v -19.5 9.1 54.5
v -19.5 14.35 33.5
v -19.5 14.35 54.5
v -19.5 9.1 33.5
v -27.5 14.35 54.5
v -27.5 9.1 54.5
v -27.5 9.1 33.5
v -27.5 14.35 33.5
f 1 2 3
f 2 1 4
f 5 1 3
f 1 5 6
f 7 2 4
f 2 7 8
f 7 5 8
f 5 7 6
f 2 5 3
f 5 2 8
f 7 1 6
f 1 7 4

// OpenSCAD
// file: D:/Projects/assembly-workshop/outputs/Screen_Pi_Hue_SCR5-H8_2026-10-31/checks/geometry.scad
// SCR5-G; mm; FRONT view: X right, Z up, Y into rack. Glass/plate front Y=0.
// Measured values: work/screen-5in/Dimensions.md. Physical fit/strength UNKNOWN.
part="plate";
DROP=0.45; // coupon winner can be substituted here; all three pins use this DROP
LIP=0.8; LIP_ON=true;
LIP_EDGES=[true,true,false,false]; // left,right,bottom,top; Brian: side lips only, cosmetic
FRAME_STEP=1.5; // measured glass-edge inset to metal LCD frame, left/right only
SHIM=0; // moves rear frame seat and plate-boss mating face back
$fn=48;
GCX=33; GCZ=41.5; PW=252; PH=88.8; PT=4;
GW=120.7; GH=77.2; CLEAR=0.2; WW=GW+2*CLEAR; WH=GH+2*CLEAR;
SEAT=13.3+SHIM; FT=3;
SO=[56.45,34]; BTN_X=[45.5,35.5,25.5];
PCB_TOP=38; GAP=0.10; LEAF_T=0.8;
HOLE=[3.4,40.3,44.7];
BX=[GCX-68,GCX+68]; BZ=[10,72];
// DSI connector X extent is unmeasured: conservative assumed 8 mm inward from PCB edge.
DSI=[GCX-60.5,9.1,GCZ-38+30,8,5.25,21];
module xz(y,d){translate([0,y+d,0])rotate([90,0,0])linear_extrude(d)children();}
// rr/rack_slots copied from SCR5-F; same exact slot centres, outline shifted -0.05 Z to centre 44.4.
module rr(w,h,r){hull()for(x=[-w/2+r,w/2-r],z=[-h/2+r,h/2-r])translate([x,z])circle(r=r);}
module rack_slots(){for(x=[-118.2625,118.2625],z=[6.323,38.127,50.773,82.577])translate([x,z])hull()for(dx=[-1.5,1.5])translate([dx,0])circle(d=7);}
module cyl_y(x,y,z,d,h){translate([x,y,z])rotate([-90,0,0])cylinder(d=d,h=h);}
module window_cut(){
  xz(-0.02,4.04)translate([GCX,GCZ])square([WW,WH],center=true);
  // 0.3 x 45-degree chamfer, square corners, front only.
  translate([GCX,0.3,GCZ])rotate([90,0,0])
    linear_extrude(height=0.3,scale=[(WW+0.6)/WW,(WH+0.6)/WH])square([WW,WH],center=true);
}
module lips(){
  // Cosmetic side ledges only; rear frame/standoffs set depth and retain the screen.
  if(LIP_ON)for(i=[0:3])if(LIP_EDGES[i]){
    if(i<2)translate([GCX+(i==0?-WW/2:WW/2-LIP),2.5,GCZ-GH/2+4])cube([LIP,0.8,GH-8]);
    else translate([GCX-GW/2+4,2.5,GCZ+(i==2?-WH/2:WH/2-LIP)])cube([GW-8,0.8,LIP]);
  }
}
// Leaf/nub/bump geometry copied from SCR5-WP-A, translated to this glass centre.
module leaves(){for(x=BTN_X)translate([GCX+x-1.5,0,GCZ]){
  translate([0,0,PCB_TOP+GAP+0.9+0.1])cube([3,11.8,LEAF_T]);
  translate([0,10.2,PCB_TOP+GAP])cube([3,1.4,1.0+LEAF_T/2]);
  translate([0,10.4,PCB_TOP+GAP+1.0+LEAF_T])cube([3,1.0,0.9]);
}}
module plate(){difference(){union(){
  difference(){xz(0,PT)translate([0,PH/2])rr(PW,PH,2.5);window_cut();}
  for(x=BX,z=BZ)cyl_y(x,3.9,z,8,SEAT-3.9);
  leaves(); lips();
 }
 xz(-0.02,4.04)rack_slots();
 for(x=BTN_X)translate([GCX+x-HOLE[0]/2,-0.02,GCZ+HOLE[1]])cube([HOLE[0],SEAT+FT+0.04,HOLE[2]-HOLE[1]]);
 // Printed-in screw pilots (no heat-set OD assumption): nominal M2.5, fit UNKNOWN.
 for(x=BX,z=BZ)cyl_y(x,SEAT-6,z,2.1,6.02);
 // Rear engraving, 0.5 deep, left field.
 xz(3.5,0.52)translate([-75,40])mirror([1,0])text("SCR5-G",size=6,halign="center",font="Liberation Sans:style=Bold");
}}
module frame_blank(){
  // C-shaped perimeter; no material across the board centre / touch FPC.
  xz(SEAT,FT)translate([GCX,GCZ])difference(){square([132,76],center=true);square([116,60],center=true);}
  for(sx=[-1,1],sz=[-1,1])cyl_y(GCX+sx*SO[0],SEAT,GCZ+sz*SO[1],9,FT);
  for(x=BX,z=BZ)hull(){cyl_y(x,SEAT,z,8,FT);cyl_y(GCX+(x<GCX?-62:62),SEAT,z,8,FT);}
}
module dsi_keepout(){translate([DSI[0]-3,DSI[1]-3,DSI[2]-3])cube([DSI[3]+6,DSI[4]+6,DSI[5]+6]);}
module ribbon_route(){
  // Open left/up corridor 18 mm wide; extends past top of plate.
  translate([GCX-84,6.1,GCZ-11])cube([18,24,65]);
  translate([GCX-84,6.1,GCZ-11])cube([32,24,27]);
}
module frame(){difference(){frame_blank();dsi_keepout();ribbon_route();
 for(sx=[-1,1],sz=[-1,1])cyl_y(GCX+sx*SO[0],SEAT-0.02,GCZ+sz*SO[1],2.8,FT+0.04);
 for(x=BX,z=BZ)cyl_y(x,SEAT-0.02,z,2.8,FT+0.04);
}}
// Pin polygon/cap/notch/dot design copied unchanged from SCR5-WP-A.
module pin(d,dots){s=2*d+0.5;difference(){union(){
 translate([-1.5,0,0])rotate([90,0,90])linear_extrude(3)polygon([
 [-s-0.02,40.5],[10.2,40.5],[10.2,41.0],[11.5,41.0],[11.5+2*d,41.0-d],[15,41.0-d],[15,44.5],[-s-0.02,44.5]]);
 translate([-2.5,-s-1.5,39.6])cube([5,1.5,5.8]);
 }for(i=[0:dots-1])translate([(i-(dots-1)/2)*1.4,-s-1.5-0.01,43.5])rotate([-90,0,0])cylinder(d=0.9,h=0.4);}}
module placed_pin(i){translate([GCX+BTN_X[i],0,GCZ])pin(DROP,i+1);}
// Measured layers: cover glass 0.9 + second glass 1.6, metal frame 3.0,
// open gap 2.0, PCB 1.6. Metal frame inset ~1.5 at LEFT/RIGHT only.
// PCB centred under glass and full metal-frame top/bottom extent remain UNKNOWN.
module glass(){translate([GCX-GW/2,0,GCZ-GH/2])cube([GW,2.5,GH]);}
module lcd(){
  translate([GCX-GW/2+FRAME_STEP,2.5,GCZ-GH/2])cube([GW-2*FRAME_STEP,3.0,GH]);
}
module pcb(){translate([GCX-60.5,7.5,GCZ-38])cube([121,1.6,76]);}
module standoffs(){for(sx=[-1,1],sz=[-1,1])difference(){cyl_y(GCX+sx*SO[0],9.1,GCZ+sz*SO[1],5.5,4.2);cyl_y(GCX+sx*SO[0],9.08,GCZ+sz*SO[1],2.5,4.24);}}
module buttons(){for(x=BTN_X){
 translate([GCX+x-3.5,9.1,GCZ+38-3.4])cube([7,3.6,2.4]);
 translate([GCX+x-1.5,9.1,GCZ+37])cube([3,3.6,1]);
}}
module dsi(){translate([DSI[0],DSI[1],DSI[2]])cube([DSI[3],DSI[4],DSI[5]]);}
module touch(){translate([GCX-10,9.1,GCZ-5])cube([20,2,10]);} // lateral extent unmeasured
module dummy(){glass();lcd();pcb();standoffs();buttons();dsi();touch();}
module assembly(){color("gray")plate();color("orange")frame();for(i=[0:2])color("cyan")placed_pin(i);color([0.2,0.3,0.4,0.4])dummy();}
// main file
include <D:/Projects/assembly-workshop/outputs/Screen_Pi_Hue_SCR5-H8_2026-10-31/checks/geometry.scad>
intersection(){dsi();ribbon_route();}
